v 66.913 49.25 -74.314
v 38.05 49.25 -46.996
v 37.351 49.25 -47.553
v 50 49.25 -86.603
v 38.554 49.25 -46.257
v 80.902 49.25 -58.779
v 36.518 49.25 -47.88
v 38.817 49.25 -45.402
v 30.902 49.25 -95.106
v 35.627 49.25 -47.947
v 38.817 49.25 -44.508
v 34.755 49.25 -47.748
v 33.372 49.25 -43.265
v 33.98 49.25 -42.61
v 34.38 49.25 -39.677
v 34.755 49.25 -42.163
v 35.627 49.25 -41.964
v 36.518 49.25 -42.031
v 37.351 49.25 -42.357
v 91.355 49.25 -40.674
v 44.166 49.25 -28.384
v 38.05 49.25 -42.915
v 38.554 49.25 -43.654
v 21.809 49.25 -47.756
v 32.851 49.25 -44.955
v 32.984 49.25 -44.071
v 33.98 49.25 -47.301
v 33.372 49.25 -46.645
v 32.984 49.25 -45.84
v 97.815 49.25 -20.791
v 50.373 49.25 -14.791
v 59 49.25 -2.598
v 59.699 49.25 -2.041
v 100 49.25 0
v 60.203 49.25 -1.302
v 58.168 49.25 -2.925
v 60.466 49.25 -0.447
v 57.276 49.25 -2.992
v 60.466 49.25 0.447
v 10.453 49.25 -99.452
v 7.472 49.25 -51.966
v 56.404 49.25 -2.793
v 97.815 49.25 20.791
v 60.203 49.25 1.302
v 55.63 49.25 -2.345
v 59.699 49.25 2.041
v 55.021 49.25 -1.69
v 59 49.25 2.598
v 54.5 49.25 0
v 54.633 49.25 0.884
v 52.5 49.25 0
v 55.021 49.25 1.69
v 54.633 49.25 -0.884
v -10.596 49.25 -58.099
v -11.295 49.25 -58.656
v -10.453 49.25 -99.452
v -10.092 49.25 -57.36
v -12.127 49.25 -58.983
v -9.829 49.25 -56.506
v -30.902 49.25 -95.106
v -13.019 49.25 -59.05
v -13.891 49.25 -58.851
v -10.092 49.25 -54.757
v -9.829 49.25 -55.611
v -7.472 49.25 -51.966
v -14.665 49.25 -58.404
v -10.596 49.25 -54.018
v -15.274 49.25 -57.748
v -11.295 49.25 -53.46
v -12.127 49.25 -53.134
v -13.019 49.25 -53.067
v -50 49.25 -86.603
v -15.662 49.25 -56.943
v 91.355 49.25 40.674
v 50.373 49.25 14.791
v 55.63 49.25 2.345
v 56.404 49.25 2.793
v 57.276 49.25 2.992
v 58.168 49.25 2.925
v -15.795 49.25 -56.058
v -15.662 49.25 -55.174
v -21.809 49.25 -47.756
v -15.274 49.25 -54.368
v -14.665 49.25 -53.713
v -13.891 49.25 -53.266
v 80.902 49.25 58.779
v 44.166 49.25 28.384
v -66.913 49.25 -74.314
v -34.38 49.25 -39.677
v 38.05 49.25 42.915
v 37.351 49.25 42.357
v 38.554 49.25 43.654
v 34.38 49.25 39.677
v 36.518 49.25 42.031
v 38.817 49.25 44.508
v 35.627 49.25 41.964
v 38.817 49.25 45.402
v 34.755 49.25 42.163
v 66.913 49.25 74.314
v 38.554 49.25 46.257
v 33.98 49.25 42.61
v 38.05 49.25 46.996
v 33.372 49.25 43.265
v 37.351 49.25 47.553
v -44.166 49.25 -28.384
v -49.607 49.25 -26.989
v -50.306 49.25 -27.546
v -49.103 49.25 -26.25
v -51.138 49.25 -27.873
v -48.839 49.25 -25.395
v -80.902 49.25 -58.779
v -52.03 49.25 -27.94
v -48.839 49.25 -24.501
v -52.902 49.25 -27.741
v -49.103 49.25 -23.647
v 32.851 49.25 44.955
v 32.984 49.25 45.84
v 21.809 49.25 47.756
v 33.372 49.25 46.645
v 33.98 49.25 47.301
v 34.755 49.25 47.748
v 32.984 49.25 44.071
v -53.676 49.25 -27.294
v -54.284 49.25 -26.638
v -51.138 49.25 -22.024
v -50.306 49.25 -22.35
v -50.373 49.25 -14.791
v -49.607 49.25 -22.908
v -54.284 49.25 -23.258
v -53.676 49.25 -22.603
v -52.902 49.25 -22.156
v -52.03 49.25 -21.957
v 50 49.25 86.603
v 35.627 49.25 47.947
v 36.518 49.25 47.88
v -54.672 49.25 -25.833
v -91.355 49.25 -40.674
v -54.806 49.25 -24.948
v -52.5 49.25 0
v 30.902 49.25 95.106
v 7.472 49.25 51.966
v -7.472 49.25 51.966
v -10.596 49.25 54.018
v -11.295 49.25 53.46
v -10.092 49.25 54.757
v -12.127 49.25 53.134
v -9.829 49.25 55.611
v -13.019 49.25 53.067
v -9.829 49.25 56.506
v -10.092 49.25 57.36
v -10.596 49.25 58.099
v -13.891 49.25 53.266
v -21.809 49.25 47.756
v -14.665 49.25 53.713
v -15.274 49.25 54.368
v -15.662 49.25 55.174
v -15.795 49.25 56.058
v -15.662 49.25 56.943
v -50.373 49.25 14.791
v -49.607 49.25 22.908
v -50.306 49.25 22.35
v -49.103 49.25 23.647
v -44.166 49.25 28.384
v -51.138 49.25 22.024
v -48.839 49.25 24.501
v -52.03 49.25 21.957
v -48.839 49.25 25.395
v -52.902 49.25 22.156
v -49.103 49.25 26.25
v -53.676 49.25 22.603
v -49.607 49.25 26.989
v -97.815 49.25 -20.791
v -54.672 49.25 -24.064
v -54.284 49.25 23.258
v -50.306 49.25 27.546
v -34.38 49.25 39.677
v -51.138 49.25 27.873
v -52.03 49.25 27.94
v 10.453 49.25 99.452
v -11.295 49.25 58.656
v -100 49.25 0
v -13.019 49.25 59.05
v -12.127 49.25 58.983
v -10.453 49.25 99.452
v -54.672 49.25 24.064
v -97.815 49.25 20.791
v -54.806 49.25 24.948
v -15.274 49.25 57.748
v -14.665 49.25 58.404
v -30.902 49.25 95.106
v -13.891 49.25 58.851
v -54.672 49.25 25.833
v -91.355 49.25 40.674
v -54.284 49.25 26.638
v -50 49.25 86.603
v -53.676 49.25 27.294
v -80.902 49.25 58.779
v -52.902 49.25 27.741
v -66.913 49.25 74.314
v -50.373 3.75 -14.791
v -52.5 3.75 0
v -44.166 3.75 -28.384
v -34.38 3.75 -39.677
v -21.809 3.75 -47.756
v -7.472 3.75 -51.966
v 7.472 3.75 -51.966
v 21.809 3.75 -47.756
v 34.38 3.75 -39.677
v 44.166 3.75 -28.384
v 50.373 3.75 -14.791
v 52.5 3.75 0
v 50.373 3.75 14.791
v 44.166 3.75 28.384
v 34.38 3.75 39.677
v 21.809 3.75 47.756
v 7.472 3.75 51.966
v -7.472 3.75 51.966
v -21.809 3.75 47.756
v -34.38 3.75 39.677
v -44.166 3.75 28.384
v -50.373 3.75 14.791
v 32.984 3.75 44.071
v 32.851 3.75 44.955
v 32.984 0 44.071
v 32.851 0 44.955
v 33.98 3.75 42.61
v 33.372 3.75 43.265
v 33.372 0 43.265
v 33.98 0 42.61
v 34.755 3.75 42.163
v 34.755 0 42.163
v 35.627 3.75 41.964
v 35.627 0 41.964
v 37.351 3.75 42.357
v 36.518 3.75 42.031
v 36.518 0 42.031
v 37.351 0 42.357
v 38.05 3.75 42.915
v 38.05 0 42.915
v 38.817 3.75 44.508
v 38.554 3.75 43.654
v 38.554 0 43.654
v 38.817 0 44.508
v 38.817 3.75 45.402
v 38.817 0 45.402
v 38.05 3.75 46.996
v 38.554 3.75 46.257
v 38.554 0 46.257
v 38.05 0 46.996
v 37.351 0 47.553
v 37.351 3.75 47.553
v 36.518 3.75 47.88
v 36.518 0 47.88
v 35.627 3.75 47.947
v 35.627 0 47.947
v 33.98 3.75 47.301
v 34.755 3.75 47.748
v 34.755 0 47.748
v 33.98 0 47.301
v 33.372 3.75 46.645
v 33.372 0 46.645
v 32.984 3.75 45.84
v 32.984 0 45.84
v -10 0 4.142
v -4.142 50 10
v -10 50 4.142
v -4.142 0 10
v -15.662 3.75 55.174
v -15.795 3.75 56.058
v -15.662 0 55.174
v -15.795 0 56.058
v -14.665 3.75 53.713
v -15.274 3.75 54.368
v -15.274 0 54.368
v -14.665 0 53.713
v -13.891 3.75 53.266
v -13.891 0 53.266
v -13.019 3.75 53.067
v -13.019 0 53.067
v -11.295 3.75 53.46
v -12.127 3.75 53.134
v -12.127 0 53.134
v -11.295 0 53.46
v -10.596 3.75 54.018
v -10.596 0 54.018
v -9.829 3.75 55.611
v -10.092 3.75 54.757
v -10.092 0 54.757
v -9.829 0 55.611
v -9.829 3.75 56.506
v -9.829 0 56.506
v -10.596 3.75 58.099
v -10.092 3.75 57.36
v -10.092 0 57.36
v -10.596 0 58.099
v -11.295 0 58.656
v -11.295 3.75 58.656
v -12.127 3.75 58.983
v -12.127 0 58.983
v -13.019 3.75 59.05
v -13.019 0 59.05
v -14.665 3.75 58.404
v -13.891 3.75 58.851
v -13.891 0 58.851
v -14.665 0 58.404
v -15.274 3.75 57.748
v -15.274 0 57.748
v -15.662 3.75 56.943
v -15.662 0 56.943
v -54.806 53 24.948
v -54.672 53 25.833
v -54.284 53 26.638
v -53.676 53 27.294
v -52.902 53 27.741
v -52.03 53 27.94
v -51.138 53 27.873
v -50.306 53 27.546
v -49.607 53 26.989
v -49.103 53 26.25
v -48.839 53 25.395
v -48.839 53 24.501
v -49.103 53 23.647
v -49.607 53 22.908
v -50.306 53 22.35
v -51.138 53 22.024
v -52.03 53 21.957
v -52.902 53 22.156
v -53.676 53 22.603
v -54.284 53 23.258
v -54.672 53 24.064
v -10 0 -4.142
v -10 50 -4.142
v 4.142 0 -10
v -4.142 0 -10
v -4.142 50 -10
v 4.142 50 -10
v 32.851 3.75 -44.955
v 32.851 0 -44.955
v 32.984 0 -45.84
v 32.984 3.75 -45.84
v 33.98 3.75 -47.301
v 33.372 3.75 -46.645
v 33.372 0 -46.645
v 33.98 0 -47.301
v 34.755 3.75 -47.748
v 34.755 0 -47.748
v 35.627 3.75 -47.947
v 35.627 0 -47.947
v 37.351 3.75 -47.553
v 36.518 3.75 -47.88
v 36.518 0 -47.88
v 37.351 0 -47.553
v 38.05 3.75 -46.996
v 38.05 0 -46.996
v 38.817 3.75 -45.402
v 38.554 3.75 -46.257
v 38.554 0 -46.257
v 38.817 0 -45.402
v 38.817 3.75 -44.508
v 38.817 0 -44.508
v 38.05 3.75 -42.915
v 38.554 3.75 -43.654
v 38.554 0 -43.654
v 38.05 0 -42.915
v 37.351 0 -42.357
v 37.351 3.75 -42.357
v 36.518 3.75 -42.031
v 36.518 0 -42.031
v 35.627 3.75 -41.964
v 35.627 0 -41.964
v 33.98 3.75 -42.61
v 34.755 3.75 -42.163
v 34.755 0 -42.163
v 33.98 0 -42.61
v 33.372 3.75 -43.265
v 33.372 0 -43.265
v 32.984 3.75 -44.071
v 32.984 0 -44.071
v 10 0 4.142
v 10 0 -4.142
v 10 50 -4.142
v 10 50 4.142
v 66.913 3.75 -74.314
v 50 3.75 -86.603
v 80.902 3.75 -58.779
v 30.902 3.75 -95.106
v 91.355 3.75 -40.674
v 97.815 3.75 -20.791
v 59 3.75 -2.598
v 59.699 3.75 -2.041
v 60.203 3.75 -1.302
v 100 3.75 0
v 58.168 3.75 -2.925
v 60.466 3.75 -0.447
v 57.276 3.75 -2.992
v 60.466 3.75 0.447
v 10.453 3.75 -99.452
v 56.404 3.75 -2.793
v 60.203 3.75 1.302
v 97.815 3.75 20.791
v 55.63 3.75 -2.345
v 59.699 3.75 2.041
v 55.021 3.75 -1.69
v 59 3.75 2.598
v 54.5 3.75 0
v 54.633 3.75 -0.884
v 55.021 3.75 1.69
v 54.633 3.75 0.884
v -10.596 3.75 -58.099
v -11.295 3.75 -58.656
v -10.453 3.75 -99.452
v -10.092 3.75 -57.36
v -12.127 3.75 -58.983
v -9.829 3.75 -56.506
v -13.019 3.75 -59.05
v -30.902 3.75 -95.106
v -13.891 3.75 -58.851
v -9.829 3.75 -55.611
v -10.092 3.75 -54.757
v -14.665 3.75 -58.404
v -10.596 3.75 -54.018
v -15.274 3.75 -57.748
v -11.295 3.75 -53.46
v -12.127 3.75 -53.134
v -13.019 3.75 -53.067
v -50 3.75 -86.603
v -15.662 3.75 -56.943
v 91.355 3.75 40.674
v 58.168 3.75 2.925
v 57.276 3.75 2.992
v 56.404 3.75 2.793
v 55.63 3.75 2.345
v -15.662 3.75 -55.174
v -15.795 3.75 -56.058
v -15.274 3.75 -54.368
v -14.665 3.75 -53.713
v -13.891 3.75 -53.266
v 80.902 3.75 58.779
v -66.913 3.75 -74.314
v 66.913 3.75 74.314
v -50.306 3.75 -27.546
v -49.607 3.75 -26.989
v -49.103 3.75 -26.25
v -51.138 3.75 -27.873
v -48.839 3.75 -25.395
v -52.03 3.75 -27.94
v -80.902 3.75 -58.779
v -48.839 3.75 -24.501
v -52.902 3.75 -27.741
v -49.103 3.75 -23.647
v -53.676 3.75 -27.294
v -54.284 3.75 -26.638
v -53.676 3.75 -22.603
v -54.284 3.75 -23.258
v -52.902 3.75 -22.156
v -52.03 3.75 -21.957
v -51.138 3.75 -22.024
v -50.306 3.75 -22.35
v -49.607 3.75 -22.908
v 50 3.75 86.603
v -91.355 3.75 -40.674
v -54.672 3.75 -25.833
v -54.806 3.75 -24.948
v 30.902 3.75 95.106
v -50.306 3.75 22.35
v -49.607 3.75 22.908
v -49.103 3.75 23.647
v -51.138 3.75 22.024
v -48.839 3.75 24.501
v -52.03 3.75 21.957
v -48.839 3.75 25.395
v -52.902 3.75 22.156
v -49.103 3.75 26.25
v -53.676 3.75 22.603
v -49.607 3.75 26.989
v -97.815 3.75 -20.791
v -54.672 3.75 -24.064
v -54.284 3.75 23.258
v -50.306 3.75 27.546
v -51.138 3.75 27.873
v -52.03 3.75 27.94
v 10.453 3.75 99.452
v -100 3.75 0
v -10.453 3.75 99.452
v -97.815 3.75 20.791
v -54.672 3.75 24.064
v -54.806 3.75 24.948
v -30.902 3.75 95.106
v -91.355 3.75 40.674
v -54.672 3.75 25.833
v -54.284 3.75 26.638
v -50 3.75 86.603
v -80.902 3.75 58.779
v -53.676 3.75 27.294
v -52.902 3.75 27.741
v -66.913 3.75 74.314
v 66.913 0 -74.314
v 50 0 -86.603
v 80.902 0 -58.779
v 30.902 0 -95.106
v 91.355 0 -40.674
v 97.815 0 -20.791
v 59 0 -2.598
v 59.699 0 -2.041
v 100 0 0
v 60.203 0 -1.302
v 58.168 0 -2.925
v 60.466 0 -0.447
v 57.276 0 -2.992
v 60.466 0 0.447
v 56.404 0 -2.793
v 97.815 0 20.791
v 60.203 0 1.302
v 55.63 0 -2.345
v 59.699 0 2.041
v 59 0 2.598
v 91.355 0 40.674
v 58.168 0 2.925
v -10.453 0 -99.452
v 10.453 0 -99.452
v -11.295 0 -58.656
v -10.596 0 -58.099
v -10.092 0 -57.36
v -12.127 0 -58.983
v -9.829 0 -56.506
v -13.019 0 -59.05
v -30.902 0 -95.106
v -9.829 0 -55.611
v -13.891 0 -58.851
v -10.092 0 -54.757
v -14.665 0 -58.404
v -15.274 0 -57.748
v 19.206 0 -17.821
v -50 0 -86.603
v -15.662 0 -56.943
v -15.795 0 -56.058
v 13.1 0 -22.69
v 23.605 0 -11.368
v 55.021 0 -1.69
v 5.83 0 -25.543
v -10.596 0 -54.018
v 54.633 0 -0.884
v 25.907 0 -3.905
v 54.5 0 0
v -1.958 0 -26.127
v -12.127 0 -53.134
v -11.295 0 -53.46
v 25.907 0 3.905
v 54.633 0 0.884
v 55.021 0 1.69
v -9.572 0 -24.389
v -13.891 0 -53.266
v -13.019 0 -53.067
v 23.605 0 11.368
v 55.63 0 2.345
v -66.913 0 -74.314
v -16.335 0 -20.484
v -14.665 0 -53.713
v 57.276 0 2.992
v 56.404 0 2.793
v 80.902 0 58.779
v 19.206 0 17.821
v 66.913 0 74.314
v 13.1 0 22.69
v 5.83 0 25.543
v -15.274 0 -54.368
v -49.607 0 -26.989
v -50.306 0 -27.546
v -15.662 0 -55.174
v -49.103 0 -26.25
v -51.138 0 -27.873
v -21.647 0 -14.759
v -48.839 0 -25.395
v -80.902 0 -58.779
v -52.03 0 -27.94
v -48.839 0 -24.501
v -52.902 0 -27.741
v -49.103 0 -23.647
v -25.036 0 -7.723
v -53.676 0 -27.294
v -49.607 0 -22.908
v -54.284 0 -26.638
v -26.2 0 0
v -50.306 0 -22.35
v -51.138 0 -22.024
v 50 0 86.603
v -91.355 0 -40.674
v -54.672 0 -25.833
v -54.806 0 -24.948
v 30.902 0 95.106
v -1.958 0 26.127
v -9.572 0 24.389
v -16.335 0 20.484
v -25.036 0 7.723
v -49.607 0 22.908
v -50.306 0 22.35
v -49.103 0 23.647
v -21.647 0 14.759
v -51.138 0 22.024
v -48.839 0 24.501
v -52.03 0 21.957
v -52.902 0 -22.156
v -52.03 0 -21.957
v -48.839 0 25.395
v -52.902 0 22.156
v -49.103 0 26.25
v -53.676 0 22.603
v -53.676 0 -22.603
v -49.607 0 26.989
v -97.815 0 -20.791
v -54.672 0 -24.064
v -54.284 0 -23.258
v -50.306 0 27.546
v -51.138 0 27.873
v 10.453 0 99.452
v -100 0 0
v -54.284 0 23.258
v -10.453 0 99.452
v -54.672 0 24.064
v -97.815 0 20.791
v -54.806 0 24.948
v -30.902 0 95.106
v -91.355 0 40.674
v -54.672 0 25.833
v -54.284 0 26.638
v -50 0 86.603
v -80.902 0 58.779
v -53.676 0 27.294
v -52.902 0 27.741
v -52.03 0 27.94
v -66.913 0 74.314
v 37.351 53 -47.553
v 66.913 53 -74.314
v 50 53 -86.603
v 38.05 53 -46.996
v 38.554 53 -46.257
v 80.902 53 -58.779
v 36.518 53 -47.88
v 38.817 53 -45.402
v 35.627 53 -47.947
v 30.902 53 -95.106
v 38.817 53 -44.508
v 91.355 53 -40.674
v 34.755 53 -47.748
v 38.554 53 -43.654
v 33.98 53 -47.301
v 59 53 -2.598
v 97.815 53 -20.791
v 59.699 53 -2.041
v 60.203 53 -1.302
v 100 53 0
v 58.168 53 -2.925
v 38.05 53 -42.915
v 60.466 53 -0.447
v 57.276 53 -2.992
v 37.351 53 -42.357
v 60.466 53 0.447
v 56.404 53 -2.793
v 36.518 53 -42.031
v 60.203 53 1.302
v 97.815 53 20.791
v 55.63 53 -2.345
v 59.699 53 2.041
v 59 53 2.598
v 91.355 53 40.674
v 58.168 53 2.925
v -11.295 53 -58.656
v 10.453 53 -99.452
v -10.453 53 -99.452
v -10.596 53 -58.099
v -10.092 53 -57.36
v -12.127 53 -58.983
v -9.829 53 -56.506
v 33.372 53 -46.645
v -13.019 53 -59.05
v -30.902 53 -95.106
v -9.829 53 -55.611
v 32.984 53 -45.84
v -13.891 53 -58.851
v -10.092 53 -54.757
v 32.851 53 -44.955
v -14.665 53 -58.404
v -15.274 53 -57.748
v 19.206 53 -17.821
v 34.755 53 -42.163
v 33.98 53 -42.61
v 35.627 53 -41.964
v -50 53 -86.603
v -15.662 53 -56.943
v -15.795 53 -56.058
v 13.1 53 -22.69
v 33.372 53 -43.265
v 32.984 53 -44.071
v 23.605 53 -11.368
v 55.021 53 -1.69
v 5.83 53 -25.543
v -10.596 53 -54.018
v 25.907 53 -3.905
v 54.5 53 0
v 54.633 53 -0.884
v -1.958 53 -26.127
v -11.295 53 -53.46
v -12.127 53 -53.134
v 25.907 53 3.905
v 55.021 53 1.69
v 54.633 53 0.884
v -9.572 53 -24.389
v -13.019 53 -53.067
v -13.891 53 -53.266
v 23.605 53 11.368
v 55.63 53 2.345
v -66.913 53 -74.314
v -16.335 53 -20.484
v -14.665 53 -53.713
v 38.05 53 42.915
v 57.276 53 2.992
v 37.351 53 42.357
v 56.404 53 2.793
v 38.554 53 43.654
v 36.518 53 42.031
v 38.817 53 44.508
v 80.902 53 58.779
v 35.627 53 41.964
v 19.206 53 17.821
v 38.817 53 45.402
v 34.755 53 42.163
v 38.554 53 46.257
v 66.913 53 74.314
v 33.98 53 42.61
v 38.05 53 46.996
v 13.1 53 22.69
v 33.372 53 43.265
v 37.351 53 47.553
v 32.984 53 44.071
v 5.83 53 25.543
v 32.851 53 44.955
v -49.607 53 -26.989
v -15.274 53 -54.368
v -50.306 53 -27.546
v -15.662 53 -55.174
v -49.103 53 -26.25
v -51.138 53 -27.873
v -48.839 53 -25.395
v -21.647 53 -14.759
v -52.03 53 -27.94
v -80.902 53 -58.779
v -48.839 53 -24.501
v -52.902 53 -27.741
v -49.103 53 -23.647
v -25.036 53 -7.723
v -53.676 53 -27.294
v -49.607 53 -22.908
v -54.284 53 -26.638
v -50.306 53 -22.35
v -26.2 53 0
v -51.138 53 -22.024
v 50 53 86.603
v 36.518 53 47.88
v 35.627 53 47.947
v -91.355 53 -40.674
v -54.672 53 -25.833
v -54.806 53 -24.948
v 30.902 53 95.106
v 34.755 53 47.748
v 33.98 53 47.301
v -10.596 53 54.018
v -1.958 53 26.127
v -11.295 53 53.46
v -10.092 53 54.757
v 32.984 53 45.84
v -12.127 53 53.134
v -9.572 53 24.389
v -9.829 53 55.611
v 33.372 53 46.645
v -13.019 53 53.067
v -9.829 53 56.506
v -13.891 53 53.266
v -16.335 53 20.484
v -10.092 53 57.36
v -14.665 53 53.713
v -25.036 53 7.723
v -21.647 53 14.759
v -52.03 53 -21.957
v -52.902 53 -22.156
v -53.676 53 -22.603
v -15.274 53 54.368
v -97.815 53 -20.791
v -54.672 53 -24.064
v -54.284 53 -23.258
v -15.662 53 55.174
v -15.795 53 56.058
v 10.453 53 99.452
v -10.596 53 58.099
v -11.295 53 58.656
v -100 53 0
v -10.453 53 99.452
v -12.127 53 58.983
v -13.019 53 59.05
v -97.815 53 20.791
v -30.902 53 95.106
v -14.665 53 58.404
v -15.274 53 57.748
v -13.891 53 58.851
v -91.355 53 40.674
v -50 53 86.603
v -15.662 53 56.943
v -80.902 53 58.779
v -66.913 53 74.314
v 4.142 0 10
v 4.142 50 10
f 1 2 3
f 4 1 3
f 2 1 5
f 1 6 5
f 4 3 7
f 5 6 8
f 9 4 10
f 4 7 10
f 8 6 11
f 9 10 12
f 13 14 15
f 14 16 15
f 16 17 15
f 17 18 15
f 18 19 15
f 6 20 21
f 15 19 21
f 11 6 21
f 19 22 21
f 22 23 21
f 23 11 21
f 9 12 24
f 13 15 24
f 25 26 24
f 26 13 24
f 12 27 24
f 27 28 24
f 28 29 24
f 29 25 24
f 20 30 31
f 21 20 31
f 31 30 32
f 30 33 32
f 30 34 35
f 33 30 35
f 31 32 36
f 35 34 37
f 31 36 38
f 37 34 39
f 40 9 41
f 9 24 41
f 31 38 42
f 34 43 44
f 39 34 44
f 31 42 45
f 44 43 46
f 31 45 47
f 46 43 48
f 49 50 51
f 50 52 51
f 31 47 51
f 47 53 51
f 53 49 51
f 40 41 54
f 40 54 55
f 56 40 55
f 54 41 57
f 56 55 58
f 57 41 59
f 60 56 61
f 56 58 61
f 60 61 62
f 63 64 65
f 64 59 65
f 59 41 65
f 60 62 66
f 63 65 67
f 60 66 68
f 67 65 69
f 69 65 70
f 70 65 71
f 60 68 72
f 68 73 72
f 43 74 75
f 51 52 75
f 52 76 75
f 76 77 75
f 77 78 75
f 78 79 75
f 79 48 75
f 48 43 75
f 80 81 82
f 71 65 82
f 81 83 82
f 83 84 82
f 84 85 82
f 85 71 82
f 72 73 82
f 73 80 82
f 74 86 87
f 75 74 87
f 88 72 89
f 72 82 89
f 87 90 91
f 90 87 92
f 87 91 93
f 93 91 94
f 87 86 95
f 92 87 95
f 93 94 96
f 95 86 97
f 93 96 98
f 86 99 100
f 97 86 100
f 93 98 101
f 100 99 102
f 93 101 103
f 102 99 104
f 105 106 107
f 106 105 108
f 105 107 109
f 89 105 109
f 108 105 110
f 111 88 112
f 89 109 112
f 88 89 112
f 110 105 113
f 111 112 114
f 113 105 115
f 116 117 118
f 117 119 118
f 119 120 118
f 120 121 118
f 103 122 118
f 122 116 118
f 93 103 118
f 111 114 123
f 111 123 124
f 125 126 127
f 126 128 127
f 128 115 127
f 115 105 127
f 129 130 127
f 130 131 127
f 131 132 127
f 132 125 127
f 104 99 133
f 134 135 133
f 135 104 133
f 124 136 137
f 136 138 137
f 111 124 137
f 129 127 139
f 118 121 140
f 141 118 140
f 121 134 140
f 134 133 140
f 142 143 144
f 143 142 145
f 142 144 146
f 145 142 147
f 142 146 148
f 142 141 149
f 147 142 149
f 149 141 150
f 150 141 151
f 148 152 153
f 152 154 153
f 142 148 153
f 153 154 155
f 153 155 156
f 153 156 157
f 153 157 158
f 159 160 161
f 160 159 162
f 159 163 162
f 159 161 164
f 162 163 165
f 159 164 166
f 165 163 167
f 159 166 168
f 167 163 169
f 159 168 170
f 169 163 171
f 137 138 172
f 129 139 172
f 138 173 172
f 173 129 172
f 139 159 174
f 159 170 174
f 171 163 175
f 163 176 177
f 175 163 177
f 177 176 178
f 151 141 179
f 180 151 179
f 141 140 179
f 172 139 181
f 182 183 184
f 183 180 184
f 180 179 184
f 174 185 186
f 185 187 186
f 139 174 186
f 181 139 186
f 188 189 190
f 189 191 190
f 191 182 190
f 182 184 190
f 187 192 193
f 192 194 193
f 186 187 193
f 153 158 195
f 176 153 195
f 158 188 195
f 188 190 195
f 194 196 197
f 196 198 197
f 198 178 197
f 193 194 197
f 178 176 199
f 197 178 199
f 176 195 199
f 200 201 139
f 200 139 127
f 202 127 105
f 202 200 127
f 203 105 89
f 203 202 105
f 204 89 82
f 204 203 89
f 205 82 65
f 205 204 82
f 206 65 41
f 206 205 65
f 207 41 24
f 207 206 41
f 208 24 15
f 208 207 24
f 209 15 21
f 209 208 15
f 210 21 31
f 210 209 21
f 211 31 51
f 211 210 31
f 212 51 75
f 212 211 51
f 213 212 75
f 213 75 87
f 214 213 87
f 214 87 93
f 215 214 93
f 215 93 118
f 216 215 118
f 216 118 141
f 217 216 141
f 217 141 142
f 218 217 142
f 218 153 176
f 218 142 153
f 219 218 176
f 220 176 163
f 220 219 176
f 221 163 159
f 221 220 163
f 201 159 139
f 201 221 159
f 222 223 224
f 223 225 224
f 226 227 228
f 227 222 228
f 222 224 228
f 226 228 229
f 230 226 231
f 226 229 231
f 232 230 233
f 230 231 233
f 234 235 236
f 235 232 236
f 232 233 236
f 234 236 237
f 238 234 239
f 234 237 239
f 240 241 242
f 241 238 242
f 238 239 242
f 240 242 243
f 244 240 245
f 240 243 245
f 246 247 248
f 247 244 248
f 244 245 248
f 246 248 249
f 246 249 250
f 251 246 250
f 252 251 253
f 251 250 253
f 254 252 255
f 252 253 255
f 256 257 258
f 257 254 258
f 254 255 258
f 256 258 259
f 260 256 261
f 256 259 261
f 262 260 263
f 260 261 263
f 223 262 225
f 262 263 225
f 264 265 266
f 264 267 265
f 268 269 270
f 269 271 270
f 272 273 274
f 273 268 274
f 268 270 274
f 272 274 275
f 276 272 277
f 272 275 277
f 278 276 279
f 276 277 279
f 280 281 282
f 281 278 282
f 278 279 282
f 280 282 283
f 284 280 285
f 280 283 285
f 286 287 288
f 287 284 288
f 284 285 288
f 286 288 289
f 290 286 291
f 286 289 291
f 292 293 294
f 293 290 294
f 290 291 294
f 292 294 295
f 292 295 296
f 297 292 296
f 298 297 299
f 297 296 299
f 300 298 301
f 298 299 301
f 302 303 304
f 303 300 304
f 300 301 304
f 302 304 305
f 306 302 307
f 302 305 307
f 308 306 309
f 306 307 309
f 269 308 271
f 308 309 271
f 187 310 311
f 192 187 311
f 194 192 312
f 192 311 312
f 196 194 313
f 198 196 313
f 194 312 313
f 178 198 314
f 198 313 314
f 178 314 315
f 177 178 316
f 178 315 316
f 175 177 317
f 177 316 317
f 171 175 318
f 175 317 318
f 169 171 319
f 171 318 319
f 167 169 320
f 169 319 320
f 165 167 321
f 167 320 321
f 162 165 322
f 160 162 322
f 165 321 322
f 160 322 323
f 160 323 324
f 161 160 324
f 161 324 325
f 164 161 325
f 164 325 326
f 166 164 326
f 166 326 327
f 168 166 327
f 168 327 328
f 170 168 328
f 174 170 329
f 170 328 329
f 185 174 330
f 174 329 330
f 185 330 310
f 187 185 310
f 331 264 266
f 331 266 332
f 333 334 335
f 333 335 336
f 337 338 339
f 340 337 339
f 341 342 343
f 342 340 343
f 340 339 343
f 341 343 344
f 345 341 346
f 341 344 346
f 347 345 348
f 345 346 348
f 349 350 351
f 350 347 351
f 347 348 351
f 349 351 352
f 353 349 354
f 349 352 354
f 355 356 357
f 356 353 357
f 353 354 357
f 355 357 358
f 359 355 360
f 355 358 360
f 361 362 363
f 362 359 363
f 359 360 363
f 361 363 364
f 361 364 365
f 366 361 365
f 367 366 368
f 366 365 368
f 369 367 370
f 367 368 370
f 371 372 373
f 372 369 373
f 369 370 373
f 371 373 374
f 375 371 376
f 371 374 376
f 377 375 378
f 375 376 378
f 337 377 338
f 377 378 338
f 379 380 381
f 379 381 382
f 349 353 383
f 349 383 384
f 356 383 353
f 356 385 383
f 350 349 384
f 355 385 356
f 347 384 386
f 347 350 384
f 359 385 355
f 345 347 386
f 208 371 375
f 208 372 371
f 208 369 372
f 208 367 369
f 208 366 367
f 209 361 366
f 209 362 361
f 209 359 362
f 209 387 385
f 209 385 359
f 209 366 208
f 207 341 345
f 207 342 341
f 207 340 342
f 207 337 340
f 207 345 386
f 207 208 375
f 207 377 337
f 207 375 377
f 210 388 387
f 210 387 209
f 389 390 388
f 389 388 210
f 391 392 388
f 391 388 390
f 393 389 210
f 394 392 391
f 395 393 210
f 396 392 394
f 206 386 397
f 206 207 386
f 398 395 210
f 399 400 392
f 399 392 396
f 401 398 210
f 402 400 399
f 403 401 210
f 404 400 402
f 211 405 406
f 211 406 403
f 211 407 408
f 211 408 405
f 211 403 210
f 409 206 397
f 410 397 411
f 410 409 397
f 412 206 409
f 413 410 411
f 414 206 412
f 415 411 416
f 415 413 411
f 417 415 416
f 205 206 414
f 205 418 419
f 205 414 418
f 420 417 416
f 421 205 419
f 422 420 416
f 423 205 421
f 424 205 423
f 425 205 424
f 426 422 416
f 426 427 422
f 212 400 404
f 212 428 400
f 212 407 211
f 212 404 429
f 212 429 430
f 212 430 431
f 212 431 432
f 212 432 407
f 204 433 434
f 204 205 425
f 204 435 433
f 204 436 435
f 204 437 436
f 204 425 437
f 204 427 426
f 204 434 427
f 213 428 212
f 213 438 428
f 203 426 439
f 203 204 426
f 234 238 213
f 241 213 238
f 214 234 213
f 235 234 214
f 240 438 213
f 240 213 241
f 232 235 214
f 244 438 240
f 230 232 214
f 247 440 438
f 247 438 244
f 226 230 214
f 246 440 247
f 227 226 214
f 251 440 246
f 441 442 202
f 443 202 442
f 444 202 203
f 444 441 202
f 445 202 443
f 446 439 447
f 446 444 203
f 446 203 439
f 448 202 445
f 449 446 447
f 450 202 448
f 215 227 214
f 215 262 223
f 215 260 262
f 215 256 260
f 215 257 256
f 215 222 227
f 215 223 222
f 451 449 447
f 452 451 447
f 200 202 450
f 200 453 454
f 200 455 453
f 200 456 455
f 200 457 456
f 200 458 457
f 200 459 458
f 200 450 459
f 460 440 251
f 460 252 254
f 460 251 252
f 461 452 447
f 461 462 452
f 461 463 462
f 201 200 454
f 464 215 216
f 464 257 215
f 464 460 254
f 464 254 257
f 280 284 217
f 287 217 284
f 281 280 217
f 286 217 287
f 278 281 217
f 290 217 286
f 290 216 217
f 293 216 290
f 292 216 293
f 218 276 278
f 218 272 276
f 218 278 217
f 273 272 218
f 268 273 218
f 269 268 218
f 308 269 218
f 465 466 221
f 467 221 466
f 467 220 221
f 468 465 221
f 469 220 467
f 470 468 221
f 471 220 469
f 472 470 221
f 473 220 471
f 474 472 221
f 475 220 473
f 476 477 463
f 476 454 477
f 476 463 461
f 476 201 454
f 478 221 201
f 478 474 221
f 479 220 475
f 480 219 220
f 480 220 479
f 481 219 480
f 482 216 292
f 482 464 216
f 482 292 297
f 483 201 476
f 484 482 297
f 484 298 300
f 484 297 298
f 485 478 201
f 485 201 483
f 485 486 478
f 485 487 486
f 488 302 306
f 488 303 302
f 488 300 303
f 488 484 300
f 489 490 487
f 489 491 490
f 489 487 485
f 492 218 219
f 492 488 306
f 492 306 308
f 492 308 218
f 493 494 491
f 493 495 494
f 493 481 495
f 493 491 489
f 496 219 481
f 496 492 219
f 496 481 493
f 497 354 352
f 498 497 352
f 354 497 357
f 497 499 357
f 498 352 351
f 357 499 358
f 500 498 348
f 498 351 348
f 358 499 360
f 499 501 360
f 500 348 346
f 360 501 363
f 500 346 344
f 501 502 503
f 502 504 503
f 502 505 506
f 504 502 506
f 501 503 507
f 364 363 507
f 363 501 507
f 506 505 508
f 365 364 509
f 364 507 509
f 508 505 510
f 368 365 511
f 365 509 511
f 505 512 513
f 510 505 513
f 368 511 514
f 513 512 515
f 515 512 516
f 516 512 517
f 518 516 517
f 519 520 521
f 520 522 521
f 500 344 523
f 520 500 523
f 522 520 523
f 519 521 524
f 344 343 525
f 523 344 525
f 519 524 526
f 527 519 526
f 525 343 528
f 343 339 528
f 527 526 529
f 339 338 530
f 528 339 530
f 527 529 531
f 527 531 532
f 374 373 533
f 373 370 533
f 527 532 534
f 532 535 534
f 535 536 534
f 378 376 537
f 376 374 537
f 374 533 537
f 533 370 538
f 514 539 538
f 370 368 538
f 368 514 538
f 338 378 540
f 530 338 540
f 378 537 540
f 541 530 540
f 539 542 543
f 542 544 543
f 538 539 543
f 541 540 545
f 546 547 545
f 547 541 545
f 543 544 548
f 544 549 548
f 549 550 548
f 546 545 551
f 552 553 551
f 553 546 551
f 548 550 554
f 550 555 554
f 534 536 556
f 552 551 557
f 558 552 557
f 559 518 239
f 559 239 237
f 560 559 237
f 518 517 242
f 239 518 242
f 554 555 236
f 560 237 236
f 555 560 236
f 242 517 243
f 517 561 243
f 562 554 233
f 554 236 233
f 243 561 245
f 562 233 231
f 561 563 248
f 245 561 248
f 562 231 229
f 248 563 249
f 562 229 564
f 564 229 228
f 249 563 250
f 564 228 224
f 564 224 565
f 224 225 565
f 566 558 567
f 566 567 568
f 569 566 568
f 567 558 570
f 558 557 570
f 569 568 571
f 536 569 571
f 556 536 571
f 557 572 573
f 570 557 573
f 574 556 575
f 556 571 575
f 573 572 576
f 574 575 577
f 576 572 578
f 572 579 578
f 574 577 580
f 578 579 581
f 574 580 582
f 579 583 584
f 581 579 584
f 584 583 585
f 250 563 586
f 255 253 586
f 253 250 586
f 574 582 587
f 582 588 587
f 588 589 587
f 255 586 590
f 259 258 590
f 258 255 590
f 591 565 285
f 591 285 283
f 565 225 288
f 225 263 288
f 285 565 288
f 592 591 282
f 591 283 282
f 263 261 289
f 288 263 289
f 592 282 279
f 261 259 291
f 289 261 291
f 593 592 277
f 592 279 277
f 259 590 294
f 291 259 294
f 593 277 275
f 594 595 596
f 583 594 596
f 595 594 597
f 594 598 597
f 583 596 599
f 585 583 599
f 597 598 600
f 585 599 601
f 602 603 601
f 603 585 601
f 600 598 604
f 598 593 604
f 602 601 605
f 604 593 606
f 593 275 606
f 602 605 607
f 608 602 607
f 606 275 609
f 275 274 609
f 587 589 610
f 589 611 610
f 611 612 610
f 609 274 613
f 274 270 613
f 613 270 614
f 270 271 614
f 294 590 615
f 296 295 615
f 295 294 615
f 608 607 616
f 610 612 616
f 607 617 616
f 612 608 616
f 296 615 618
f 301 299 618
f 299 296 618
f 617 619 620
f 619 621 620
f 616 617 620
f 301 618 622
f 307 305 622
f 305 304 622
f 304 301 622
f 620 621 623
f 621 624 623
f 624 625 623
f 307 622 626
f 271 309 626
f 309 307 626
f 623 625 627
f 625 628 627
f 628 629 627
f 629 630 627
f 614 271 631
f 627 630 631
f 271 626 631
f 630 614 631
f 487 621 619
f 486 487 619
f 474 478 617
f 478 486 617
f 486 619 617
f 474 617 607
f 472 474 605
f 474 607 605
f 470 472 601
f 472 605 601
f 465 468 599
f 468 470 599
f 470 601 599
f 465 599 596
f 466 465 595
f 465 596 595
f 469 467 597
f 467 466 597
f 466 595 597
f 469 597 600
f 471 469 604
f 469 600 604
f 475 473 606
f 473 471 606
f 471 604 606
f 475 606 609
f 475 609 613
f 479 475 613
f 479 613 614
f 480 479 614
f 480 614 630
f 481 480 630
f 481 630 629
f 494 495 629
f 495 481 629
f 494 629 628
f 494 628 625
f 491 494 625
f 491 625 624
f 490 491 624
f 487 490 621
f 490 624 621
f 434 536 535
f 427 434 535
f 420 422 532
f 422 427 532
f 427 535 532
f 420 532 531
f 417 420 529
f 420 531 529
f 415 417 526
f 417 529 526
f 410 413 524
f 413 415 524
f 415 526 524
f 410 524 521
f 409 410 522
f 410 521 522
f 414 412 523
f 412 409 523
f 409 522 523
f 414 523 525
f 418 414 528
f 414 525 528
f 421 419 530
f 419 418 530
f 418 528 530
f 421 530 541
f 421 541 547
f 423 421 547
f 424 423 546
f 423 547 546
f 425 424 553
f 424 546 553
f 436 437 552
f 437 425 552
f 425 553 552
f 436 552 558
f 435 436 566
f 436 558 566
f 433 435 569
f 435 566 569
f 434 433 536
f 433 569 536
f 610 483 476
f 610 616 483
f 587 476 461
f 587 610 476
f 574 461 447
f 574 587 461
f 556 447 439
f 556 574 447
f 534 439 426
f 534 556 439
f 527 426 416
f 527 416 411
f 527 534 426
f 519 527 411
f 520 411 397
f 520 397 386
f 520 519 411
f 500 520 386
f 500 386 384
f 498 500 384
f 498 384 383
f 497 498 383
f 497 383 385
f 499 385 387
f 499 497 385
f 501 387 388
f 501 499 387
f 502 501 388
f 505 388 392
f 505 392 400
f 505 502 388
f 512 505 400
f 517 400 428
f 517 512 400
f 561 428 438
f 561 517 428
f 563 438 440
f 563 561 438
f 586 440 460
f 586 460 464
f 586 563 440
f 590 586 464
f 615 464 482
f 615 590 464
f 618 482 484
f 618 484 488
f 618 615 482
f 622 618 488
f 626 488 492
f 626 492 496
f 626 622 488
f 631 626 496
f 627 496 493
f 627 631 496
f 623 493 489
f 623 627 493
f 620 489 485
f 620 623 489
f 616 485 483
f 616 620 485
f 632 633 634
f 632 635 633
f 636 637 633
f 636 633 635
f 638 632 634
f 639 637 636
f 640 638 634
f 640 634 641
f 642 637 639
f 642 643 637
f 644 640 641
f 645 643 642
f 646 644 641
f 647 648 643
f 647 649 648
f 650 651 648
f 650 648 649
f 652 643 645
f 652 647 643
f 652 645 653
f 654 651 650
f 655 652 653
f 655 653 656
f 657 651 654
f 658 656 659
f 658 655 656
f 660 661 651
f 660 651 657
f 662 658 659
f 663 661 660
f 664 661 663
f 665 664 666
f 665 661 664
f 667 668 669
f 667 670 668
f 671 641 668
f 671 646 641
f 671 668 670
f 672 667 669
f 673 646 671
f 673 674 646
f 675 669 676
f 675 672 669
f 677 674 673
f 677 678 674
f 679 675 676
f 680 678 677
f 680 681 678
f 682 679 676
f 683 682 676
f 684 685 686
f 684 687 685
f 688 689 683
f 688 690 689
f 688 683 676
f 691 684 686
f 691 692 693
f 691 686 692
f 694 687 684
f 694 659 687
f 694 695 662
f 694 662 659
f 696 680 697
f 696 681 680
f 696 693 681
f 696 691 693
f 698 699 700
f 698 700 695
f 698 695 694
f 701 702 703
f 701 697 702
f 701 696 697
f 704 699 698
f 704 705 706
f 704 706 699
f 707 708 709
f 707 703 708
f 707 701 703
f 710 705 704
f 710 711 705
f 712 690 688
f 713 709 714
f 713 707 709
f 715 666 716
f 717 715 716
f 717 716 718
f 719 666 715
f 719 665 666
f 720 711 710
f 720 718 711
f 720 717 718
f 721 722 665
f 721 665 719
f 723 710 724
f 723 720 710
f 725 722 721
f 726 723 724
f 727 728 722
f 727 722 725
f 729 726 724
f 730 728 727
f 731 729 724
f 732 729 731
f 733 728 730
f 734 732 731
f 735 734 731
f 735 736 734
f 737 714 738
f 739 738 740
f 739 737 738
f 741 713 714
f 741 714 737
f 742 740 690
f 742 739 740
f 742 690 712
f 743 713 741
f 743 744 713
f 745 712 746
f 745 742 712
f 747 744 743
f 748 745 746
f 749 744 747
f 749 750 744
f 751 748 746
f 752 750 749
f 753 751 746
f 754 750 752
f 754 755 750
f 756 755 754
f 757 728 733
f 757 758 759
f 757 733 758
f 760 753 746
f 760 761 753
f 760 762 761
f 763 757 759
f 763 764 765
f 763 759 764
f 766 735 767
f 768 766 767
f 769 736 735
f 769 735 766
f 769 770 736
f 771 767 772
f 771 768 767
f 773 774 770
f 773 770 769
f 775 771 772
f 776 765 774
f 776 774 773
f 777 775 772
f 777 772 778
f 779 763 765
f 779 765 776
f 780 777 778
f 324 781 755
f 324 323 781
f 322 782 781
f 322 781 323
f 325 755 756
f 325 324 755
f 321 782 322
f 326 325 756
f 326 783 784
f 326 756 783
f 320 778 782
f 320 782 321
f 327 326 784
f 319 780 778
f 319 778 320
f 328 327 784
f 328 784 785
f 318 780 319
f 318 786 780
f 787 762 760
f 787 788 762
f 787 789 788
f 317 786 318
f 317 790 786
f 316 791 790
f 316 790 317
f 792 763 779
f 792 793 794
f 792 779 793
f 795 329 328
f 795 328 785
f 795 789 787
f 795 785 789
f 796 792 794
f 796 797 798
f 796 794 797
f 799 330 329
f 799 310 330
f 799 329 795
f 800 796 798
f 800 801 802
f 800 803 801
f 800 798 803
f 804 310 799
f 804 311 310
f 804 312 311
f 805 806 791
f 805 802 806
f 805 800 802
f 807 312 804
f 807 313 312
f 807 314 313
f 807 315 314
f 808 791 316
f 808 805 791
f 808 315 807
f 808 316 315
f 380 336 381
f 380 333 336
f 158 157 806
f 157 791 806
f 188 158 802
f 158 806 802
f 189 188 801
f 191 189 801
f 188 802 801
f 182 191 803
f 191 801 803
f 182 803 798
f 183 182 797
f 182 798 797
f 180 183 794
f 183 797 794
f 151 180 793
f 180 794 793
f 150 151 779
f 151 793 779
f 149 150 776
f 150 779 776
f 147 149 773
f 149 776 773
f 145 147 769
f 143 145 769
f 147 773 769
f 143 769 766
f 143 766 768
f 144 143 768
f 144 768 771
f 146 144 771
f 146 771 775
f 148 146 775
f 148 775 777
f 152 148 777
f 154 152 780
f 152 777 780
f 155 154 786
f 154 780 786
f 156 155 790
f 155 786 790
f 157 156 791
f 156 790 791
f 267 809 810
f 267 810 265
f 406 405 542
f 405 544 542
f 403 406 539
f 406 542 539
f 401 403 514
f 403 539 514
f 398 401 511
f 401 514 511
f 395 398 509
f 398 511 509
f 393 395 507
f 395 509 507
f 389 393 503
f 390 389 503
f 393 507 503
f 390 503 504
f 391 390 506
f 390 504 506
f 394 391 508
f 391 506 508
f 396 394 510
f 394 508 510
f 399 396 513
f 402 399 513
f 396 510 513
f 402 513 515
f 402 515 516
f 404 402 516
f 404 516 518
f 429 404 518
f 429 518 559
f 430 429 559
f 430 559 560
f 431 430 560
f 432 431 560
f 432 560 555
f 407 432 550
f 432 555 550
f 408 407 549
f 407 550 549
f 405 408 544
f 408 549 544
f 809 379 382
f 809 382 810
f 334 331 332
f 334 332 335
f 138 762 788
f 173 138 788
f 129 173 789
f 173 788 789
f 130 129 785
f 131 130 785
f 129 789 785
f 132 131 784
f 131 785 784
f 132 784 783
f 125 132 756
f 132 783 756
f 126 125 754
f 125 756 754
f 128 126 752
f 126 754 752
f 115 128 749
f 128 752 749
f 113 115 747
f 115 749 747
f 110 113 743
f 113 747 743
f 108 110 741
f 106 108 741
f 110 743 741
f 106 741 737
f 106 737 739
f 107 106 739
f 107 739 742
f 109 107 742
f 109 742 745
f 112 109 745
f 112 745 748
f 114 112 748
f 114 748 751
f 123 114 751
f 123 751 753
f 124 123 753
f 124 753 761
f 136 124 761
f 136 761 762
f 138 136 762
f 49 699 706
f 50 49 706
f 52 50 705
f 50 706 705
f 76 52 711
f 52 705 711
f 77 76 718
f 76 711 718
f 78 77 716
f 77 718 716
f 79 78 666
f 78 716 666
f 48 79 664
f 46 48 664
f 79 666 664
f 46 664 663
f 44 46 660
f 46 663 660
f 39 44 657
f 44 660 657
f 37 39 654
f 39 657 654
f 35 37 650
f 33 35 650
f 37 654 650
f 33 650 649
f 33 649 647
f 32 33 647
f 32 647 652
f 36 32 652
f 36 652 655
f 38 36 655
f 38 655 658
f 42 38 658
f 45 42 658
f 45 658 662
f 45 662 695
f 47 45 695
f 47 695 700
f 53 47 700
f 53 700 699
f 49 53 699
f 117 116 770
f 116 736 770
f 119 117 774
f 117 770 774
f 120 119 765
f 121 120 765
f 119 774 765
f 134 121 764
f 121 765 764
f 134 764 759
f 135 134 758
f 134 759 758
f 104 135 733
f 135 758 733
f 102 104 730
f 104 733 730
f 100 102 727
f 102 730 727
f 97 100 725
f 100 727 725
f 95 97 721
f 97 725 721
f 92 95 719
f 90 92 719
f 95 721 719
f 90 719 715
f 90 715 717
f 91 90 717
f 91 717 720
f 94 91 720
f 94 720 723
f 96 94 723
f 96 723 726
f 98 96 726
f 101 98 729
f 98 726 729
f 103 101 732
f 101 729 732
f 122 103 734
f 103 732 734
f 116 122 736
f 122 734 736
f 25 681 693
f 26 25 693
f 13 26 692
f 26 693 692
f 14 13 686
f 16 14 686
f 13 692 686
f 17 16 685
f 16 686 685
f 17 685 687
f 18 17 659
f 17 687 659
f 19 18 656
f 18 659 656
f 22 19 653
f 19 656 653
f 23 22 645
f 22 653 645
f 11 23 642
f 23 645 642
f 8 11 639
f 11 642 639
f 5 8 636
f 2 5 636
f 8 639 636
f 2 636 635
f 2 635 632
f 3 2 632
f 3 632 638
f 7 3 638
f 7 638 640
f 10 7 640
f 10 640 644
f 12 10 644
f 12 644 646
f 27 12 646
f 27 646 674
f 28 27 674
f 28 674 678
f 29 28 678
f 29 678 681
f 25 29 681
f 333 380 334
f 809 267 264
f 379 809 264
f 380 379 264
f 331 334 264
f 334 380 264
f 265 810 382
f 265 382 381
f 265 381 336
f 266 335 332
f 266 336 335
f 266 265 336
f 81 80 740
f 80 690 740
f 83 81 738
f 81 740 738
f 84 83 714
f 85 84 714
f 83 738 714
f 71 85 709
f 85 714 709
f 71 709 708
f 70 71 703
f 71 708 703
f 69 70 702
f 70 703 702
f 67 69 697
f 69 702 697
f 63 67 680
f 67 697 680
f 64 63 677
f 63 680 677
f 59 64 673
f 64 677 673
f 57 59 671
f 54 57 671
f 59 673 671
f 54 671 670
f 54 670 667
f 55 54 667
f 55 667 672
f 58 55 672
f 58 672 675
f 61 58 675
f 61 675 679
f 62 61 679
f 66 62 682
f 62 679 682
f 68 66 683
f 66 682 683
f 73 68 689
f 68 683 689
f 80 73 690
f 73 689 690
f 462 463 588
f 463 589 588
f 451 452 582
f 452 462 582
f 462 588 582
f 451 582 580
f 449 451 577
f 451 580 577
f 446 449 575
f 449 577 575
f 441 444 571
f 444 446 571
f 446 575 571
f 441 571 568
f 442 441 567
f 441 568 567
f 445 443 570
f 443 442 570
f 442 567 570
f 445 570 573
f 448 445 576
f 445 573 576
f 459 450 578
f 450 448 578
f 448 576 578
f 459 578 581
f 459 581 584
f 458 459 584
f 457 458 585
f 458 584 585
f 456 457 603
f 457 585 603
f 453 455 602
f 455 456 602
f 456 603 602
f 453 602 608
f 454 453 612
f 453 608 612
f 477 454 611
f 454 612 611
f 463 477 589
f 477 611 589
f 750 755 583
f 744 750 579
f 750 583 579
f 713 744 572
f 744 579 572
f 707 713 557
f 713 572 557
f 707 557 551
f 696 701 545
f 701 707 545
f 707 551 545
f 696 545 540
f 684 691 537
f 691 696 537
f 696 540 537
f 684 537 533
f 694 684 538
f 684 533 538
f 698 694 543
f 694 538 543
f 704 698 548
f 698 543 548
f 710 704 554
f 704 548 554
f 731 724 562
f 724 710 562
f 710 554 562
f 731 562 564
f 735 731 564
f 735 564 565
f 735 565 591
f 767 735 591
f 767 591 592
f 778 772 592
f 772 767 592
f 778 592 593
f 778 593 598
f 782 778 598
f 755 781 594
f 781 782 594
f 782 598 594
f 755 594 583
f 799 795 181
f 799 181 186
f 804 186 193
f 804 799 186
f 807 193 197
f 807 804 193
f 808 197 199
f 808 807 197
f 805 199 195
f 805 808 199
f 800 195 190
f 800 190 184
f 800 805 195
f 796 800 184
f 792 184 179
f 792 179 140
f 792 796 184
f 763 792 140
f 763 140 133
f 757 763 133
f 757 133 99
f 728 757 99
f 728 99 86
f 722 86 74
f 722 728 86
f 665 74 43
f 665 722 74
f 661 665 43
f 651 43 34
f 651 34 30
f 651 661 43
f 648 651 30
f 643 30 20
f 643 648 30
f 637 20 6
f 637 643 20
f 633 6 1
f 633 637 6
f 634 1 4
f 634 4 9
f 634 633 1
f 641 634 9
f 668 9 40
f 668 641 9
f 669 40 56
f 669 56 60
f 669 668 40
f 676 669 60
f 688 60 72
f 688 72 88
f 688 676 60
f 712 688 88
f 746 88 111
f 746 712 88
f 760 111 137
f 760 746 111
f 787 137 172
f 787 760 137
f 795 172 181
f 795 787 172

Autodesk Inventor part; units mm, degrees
ref_plane "YZ Plane" through (0, 0, 0) normal (1, 0, 0) x (0, 1, 0)
ref_plane "XZ Plane" through (0, 0, 0) normal (0, 1, 0) x (-1, 0, 0)
ref_plane "XY Plane" through (0, 0, 0) normal (0, 0, 1) x (1, 0, 0)
sketch "Sketch1" plane through (0, 0, 0) normal (0, 1, 0) x (-1, 0, 0)
  circle A0 centre (0, 0) radius 52.5
  circle A1 centre (0, 0) radius 100
  circle A2 centre (0, 0) radius 26.2
  circle A3 centre (-57.5, 0) radius 3
  line L0 (140, 0) -> (-140, 0) projected
  circle A4 centre (-35.8507, -44.9553) radius 3
  circle A5 centre (12.795, -56.0584) radius 3
  circle A6 centre (51.8057, -24.9483) radius 3
  circle A7 centre (51.8057, 24.9483) radius 3
  circle A8 centre (12.795, 56.0584) radius 3
  circle A9 centre (-35.8507, 44.9553) radius 3
  line L1 (-10, -4.1421) -> (-10, 4.1421)
  line L2 (-10, 4.1421) -> (-4.1421, 10)
  line L3 (-4.1421, 10) -> (4.1421, 10)
  line L4 (4.1421, 10) -> (10, 4.1421)
  line L5 (10, 4.1421) -> (10, -4.1421)
  line L6 (10, -4.1421) -> (4.1421, -10)
  line L7 (4.1421, -10) -> (-4.1421, -10)
  line L8 (-4.1421, -10) -> (-10, -4.1421)
  line L9 (0, -140) -> (0, 140) projected
  dimension "d0" = 105
  dimension "d1" = 200
  dimension "d8" = 52.4
  dimension "d9" = 6
  dimension "d10" = 57.5
  dimension "d13" = 360
  dimension "d15" = 20
extrude "Extrusion1" add sketch "Sketch1" along normal blind 3.75 contours L0 A1 L9 A0 | A0 L9 A1 L0 | A0 L0 A3 A1 L9 | L9 A1 L0 A3 A0
extrude "Extrusion2" add sketch "Sketch1" along normal blind 53 contours L0 A2 L9 A0 | A0 L9 A2 L0 | L9 A2 L0 A0 | A0 L0 A2 L9
extrude "Extrusion3" add sketch "Sketch1" against normal blind 3.75 from surface at 53 contours L0 A1 L9 A0 | A0 L9 A1 L0 | A0 L0 A3 A1 L9 | L9 A1 L0 A3 A0
extrude "Extrusion4" add sketch "Sketch1" along normal blind 50 contours L5 L6 L7 L9 L0 | L0 L9 L3 L4 L5 | L9 L0 L1 L2 L3 | L7 L8 L1 L0 L9
properties part number "spool"
